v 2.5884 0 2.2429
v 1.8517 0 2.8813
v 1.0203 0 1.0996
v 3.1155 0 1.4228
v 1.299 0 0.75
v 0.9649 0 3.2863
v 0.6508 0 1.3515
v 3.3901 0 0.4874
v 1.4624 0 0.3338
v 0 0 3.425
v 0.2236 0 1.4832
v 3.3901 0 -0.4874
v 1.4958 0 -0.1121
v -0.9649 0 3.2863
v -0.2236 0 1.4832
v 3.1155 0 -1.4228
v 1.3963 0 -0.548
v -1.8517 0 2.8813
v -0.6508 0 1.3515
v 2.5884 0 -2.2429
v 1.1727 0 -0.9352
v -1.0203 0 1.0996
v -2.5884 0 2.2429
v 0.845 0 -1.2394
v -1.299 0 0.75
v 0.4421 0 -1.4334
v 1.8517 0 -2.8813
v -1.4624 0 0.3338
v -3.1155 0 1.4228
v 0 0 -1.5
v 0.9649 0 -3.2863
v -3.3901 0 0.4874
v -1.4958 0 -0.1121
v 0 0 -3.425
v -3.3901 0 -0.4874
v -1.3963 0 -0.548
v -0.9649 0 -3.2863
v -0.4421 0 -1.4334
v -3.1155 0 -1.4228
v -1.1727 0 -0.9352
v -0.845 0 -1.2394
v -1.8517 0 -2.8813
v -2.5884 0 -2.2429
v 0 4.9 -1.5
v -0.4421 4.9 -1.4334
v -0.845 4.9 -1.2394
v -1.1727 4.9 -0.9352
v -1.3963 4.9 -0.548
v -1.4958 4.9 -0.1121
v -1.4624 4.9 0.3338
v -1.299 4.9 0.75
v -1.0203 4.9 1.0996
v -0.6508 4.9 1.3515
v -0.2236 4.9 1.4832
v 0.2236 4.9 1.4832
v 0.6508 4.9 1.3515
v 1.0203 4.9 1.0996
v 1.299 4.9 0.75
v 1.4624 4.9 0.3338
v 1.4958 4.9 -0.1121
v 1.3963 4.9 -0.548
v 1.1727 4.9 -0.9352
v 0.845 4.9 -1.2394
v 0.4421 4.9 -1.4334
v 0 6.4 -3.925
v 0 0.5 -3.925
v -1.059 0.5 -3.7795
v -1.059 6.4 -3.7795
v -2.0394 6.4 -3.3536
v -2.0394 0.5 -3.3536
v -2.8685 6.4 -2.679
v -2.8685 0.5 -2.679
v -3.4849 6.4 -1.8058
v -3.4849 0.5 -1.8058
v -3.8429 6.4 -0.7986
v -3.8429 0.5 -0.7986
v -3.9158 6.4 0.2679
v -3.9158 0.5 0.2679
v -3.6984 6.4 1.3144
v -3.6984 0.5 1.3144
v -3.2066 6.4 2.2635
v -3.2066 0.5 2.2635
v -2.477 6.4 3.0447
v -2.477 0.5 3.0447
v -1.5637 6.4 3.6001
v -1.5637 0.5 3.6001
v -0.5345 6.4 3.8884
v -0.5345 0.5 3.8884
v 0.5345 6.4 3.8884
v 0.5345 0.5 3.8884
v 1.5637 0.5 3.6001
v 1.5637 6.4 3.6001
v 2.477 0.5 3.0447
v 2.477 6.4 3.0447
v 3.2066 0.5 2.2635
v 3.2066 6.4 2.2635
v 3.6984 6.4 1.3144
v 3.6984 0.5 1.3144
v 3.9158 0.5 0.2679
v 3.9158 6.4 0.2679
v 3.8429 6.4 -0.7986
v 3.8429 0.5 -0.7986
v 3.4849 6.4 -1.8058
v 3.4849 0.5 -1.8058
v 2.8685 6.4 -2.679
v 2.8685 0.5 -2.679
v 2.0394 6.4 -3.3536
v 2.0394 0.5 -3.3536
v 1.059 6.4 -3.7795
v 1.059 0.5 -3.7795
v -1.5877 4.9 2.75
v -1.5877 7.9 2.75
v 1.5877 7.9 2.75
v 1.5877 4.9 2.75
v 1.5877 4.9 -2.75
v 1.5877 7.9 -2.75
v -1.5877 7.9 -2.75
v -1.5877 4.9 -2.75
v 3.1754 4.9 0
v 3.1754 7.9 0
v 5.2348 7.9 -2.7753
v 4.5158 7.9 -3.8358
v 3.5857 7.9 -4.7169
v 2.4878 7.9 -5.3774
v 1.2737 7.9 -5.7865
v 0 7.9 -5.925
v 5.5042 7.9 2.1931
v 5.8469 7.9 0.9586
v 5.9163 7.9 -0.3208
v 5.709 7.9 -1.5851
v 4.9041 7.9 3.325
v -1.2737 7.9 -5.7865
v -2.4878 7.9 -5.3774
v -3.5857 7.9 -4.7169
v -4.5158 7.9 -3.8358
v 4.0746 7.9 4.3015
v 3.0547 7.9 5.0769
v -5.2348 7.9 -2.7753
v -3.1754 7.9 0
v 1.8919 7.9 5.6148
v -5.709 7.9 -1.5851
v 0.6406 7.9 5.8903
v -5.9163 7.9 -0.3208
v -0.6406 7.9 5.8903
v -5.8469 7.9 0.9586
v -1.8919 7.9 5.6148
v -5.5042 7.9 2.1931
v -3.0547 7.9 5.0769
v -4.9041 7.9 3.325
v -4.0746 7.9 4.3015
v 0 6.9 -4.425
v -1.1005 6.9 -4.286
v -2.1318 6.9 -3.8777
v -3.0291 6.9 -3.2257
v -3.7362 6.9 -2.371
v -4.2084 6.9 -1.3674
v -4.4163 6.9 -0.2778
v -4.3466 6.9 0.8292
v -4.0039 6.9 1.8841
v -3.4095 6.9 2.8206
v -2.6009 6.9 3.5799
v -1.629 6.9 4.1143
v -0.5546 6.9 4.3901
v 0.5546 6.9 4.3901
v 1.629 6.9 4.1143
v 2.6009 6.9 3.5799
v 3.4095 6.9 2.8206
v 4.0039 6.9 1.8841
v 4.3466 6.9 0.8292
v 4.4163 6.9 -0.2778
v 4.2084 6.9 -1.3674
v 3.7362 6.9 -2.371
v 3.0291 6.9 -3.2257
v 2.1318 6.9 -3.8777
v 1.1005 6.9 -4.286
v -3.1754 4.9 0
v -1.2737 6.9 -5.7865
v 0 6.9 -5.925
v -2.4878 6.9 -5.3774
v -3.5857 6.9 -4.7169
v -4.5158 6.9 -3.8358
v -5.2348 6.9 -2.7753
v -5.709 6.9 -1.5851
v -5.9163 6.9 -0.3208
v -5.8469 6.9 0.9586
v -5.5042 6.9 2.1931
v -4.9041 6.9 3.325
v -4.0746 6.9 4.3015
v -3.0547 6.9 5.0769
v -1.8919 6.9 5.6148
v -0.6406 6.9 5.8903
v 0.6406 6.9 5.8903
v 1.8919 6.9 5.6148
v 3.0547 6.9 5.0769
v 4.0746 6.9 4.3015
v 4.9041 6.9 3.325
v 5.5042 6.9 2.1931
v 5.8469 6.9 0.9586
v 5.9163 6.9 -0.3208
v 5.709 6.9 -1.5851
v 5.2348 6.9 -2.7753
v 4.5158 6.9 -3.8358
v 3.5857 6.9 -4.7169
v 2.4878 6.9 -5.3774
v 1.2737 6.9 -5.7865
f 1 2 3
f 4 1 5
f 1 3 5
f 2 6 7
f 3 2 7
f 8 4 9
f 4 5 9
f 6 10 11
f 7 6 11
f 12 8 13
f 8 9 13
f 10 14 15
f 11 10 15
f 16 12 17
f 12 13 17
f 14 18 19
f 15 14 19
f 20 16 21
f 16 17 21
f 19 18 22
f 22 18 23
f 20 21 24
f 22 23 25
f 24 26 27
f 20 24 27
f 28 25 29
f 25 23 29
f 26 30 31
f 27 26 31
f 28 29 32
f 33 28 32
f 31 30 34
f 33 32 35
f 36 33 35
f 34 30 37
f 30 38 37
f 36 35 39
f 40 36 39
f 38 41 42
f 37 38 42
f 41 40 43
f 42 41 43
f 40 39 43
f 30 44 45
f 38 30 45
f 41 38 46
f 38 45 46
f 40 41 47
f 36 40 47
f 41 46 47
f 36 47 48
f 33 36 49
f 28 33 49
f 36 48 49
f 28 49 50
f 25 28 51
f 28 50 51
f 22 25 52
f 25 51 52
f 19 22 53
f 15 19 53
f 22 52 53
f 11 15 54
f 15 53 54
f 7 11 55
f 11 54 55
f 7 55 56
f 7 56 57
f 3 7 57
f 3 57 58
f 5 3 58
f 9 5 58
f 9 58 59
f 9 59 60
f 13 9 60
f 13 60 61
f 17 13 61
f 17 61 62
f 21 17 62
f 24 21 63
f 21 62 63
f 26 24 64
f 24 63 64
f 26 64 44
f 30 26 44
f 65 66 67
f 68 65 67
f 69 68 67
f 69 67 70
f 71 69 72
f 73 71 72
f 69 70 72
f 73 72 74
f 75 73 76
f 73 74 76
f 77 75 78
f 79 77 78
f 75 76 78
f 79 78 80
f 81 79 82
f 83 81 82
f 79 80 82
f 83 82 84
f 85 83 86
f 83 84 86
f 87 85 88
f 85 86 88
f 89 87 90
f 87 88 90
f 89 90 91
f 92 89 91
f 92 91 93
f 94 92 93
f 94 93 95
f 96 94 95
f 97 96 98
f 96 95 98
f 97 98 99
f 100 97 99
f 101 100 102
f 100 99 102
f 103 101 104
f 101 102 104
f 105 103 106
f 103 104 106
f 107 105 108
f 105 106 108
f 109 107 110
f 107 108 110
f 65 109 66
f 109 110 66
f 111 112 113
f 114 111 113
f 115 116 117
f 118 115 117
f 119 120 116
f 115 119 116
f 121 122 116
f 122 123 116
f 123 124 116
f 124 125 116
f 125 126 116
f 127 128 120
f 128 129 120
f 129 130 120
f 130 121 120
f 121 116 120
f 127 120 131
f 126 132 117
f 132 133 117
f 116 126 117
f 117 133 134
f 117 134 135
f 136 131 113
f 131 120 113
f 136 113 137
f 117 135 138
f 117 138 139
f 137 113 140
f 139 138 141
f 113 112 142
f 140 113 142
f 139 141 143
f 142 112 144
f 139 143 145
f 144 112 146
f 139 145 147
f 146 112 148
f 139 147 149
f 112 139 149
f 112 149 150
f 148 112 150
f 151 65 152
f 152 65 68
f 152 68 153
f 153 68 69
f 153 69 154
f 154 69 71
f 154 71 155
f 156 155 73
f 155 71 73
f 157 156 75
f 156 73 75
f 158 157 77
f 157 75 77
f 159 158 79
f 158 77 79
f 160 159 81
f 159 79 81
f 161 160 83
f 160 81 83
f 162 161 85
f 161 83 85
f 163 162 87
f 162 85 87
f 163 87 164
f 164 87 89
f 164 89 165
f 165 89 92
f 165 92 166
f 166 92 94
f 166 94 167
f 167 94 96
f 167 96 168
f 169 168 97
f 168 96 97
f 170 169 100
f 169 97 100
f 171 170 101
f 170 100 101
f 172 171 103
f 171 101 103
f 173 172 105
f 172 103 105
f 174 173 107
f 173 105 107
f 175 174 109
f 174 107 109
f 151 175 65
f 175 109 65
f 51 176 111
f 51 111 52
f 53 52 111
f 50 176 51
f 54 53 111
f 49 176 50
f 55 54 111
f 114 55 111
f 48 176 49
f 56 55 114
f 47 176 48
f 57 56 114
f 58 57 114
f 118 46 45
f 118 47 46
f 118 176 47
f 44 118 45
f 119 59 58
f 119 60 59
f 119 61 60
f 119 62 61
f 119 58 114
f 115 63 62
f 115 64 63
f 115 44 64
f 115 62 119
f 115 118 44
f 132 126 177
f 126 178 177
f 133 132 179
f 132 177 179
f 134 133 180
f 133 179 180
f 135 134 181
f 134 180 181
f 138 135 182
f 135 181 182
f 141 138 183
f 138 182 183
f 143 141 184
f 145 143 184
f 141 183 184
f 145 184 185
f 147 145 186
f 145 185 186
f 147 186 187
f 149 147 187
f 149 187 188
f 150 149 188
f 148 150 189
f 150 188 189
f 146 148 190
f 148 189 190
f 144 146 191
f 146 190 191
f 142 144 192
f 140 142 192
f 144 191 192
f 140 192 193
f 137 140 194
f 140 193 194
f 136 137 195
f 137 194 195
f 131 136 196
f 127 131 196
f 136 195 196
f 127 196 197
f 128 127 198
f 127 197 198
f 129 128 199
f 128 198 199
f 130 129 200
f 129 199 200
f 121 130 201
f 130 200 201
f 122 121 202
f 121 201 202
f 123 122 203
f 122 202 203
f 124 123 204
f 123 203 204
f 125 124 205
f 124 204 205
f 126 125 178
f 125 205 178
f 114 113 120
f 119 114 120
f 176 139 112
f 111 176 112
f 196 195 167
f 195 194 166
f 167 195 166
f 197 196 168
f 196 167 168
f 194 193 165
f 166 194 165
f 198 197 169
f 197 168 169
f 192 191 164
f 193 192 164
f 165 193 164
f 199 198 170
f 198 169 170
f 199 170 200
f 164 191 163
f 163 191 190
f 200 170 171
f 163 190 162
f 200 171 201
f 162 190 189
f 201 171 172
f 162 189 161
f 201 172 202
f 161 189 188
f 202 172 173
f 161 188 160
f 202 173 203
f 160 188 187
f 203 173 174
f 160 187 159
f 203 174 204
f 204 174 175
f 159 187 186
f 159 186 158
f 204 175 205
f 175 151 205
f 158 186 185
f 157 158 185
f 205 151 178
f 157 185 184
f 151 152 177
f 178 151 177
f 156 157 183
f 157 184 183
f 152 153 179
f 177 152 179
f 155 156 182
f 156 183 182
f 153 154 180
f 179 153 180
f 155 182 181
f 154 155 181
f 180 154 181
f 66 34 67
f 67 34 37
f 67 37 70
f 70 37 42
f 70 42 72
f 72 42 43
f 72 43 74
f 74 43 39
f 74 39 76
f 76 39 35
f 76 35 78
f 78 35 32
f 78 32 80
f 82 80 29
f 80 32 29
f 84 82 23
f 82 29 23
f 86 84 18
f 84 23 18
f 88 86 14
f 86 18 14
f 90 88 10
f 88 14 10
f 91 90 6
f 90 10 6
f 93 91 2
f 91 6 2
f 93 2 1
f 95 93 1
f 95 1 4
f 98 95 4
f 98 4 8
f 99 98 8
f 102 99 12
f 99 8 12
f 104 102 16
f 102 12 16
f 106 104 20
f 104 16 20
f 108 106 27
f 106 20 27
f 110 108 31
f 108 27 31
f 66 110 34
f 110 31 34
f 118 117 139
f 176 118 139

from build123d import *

# Parameters (mm, degrees)
CHANFREIN1_SIZE         = 0.5
ENL_V_MAT_EXTRU_2_DEPTH = 3


with BuildPart() as part:
    # Esquisse1 → Révolution1 (revolve)
    with BuildSketch(Plane.XY, mode=Mode.PRIVATE) as r_volution1_sk:
        Polygon((1.5, 7.9), (5.925, 7.9), (5.925, 6.9), (3.925, 6.9), (3.925, 0), (1.5, 0), align=None)
    revolve(r_volution1_sk.sketch.rotate(Axis((0, 0, 0), (0, 1, 0)), 90), axis=Axis((0, 0, 0), (0, 1, 0)))

    # Chanfrein1
    chanfrein1_edges = [part.edges().sort_by_distance(p)[0] for p in [
        (0, 0, 3.925),
        (0, 6.9, 3.925),
    ]]
    chamfer(chanfrein1_edges, length=CHANFREIN1_SIZE)

    # Esquisse3 → Enlèv. mat.-Extru.2 (cut)
    with BuildSketch(Plane(origin=(0, 7.9, 0), x_dir=(1, 0, 0), z_dir=(0, 1, 0))):
        Polygon((1.58771324, 2.75), (-1.58771324, 2.75), (-3.175426481, 0), (-1.58771324, -2.75), (1.58771324, -2.75), (3.175426481, 0), align=None)
    extrude(amount=-ENL_V_MAT_EXTRU_2_DEPTH, mode=Mode.SUBTRACT)


solid = part.part
